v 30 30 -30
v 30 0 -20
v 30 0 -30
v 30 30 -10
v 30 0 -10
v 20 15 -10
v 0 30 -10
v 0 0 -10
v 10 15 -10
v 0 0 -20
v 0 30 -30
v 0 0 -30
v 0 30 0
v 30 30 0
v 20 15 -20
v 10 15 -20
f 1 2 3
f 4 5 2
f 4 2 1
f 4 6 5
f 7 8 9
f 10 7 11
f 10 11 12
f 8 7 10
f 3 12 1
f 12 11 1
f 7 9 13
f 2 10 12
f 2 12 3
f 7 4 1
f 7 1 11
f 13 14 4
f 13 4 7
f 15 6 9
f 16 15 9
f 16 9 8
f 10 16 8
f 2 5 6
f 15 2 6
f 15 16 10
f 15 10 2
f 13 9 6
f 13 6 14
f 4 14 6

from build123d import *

# Parameters (mm, degrees)
F1_DEPTH = 30
F2_DEPTH = 20
F3_DEPTH = 10
F5_DEPTH = 30.001


with BuildPart() as f1:
    # F0 (on Top) → F1 (new body)
    with BuildSketch(Plane.XY):
        Polygon((10, 15), (0, 0), (30, 0), (20, 15), align=None)
        Polygon((0, 30), (0, 0), (10, 15), align=None)
        Polygon((20, 15), (30, 0), (30, 30), align=None)
        Polygon((30, 30), (0, 30), (10, 15), (20, 15), align=None)
    extrude(amount=-F1_DEPTH)

    # F0 (on Top) → F2 (cut)
    with BuildSketch(Plane.XY):
        Polygon((10, 15), (0, 0), (30, 0), (20, 15), align=None)
    extrude(amount=-F2_DEPTH, mode=Mode.SUBTRACT)

    # F0 (on Top) → F3 (cut)
    with BuildSketch(Plane.XY):
        Polygon((0, 30), (0, 0), (10, 15), align=None)
        Polygon((20, 15), (30, 0), (30, 30), align=None)
    extrude(amount=-F3_DEPTH, mode=Mode.SUBTRACT)

    # F4 (on face) → F5 (cut, through all)
    with BuildSketch(Plane.YZ.offset(30)):
        Polygon((30, 0), (15, 0), (15, -10), align=None)
    extrude(amount=-F5_DEPTH, mode=Mode.SUBTRACT)


solid = f1.part
